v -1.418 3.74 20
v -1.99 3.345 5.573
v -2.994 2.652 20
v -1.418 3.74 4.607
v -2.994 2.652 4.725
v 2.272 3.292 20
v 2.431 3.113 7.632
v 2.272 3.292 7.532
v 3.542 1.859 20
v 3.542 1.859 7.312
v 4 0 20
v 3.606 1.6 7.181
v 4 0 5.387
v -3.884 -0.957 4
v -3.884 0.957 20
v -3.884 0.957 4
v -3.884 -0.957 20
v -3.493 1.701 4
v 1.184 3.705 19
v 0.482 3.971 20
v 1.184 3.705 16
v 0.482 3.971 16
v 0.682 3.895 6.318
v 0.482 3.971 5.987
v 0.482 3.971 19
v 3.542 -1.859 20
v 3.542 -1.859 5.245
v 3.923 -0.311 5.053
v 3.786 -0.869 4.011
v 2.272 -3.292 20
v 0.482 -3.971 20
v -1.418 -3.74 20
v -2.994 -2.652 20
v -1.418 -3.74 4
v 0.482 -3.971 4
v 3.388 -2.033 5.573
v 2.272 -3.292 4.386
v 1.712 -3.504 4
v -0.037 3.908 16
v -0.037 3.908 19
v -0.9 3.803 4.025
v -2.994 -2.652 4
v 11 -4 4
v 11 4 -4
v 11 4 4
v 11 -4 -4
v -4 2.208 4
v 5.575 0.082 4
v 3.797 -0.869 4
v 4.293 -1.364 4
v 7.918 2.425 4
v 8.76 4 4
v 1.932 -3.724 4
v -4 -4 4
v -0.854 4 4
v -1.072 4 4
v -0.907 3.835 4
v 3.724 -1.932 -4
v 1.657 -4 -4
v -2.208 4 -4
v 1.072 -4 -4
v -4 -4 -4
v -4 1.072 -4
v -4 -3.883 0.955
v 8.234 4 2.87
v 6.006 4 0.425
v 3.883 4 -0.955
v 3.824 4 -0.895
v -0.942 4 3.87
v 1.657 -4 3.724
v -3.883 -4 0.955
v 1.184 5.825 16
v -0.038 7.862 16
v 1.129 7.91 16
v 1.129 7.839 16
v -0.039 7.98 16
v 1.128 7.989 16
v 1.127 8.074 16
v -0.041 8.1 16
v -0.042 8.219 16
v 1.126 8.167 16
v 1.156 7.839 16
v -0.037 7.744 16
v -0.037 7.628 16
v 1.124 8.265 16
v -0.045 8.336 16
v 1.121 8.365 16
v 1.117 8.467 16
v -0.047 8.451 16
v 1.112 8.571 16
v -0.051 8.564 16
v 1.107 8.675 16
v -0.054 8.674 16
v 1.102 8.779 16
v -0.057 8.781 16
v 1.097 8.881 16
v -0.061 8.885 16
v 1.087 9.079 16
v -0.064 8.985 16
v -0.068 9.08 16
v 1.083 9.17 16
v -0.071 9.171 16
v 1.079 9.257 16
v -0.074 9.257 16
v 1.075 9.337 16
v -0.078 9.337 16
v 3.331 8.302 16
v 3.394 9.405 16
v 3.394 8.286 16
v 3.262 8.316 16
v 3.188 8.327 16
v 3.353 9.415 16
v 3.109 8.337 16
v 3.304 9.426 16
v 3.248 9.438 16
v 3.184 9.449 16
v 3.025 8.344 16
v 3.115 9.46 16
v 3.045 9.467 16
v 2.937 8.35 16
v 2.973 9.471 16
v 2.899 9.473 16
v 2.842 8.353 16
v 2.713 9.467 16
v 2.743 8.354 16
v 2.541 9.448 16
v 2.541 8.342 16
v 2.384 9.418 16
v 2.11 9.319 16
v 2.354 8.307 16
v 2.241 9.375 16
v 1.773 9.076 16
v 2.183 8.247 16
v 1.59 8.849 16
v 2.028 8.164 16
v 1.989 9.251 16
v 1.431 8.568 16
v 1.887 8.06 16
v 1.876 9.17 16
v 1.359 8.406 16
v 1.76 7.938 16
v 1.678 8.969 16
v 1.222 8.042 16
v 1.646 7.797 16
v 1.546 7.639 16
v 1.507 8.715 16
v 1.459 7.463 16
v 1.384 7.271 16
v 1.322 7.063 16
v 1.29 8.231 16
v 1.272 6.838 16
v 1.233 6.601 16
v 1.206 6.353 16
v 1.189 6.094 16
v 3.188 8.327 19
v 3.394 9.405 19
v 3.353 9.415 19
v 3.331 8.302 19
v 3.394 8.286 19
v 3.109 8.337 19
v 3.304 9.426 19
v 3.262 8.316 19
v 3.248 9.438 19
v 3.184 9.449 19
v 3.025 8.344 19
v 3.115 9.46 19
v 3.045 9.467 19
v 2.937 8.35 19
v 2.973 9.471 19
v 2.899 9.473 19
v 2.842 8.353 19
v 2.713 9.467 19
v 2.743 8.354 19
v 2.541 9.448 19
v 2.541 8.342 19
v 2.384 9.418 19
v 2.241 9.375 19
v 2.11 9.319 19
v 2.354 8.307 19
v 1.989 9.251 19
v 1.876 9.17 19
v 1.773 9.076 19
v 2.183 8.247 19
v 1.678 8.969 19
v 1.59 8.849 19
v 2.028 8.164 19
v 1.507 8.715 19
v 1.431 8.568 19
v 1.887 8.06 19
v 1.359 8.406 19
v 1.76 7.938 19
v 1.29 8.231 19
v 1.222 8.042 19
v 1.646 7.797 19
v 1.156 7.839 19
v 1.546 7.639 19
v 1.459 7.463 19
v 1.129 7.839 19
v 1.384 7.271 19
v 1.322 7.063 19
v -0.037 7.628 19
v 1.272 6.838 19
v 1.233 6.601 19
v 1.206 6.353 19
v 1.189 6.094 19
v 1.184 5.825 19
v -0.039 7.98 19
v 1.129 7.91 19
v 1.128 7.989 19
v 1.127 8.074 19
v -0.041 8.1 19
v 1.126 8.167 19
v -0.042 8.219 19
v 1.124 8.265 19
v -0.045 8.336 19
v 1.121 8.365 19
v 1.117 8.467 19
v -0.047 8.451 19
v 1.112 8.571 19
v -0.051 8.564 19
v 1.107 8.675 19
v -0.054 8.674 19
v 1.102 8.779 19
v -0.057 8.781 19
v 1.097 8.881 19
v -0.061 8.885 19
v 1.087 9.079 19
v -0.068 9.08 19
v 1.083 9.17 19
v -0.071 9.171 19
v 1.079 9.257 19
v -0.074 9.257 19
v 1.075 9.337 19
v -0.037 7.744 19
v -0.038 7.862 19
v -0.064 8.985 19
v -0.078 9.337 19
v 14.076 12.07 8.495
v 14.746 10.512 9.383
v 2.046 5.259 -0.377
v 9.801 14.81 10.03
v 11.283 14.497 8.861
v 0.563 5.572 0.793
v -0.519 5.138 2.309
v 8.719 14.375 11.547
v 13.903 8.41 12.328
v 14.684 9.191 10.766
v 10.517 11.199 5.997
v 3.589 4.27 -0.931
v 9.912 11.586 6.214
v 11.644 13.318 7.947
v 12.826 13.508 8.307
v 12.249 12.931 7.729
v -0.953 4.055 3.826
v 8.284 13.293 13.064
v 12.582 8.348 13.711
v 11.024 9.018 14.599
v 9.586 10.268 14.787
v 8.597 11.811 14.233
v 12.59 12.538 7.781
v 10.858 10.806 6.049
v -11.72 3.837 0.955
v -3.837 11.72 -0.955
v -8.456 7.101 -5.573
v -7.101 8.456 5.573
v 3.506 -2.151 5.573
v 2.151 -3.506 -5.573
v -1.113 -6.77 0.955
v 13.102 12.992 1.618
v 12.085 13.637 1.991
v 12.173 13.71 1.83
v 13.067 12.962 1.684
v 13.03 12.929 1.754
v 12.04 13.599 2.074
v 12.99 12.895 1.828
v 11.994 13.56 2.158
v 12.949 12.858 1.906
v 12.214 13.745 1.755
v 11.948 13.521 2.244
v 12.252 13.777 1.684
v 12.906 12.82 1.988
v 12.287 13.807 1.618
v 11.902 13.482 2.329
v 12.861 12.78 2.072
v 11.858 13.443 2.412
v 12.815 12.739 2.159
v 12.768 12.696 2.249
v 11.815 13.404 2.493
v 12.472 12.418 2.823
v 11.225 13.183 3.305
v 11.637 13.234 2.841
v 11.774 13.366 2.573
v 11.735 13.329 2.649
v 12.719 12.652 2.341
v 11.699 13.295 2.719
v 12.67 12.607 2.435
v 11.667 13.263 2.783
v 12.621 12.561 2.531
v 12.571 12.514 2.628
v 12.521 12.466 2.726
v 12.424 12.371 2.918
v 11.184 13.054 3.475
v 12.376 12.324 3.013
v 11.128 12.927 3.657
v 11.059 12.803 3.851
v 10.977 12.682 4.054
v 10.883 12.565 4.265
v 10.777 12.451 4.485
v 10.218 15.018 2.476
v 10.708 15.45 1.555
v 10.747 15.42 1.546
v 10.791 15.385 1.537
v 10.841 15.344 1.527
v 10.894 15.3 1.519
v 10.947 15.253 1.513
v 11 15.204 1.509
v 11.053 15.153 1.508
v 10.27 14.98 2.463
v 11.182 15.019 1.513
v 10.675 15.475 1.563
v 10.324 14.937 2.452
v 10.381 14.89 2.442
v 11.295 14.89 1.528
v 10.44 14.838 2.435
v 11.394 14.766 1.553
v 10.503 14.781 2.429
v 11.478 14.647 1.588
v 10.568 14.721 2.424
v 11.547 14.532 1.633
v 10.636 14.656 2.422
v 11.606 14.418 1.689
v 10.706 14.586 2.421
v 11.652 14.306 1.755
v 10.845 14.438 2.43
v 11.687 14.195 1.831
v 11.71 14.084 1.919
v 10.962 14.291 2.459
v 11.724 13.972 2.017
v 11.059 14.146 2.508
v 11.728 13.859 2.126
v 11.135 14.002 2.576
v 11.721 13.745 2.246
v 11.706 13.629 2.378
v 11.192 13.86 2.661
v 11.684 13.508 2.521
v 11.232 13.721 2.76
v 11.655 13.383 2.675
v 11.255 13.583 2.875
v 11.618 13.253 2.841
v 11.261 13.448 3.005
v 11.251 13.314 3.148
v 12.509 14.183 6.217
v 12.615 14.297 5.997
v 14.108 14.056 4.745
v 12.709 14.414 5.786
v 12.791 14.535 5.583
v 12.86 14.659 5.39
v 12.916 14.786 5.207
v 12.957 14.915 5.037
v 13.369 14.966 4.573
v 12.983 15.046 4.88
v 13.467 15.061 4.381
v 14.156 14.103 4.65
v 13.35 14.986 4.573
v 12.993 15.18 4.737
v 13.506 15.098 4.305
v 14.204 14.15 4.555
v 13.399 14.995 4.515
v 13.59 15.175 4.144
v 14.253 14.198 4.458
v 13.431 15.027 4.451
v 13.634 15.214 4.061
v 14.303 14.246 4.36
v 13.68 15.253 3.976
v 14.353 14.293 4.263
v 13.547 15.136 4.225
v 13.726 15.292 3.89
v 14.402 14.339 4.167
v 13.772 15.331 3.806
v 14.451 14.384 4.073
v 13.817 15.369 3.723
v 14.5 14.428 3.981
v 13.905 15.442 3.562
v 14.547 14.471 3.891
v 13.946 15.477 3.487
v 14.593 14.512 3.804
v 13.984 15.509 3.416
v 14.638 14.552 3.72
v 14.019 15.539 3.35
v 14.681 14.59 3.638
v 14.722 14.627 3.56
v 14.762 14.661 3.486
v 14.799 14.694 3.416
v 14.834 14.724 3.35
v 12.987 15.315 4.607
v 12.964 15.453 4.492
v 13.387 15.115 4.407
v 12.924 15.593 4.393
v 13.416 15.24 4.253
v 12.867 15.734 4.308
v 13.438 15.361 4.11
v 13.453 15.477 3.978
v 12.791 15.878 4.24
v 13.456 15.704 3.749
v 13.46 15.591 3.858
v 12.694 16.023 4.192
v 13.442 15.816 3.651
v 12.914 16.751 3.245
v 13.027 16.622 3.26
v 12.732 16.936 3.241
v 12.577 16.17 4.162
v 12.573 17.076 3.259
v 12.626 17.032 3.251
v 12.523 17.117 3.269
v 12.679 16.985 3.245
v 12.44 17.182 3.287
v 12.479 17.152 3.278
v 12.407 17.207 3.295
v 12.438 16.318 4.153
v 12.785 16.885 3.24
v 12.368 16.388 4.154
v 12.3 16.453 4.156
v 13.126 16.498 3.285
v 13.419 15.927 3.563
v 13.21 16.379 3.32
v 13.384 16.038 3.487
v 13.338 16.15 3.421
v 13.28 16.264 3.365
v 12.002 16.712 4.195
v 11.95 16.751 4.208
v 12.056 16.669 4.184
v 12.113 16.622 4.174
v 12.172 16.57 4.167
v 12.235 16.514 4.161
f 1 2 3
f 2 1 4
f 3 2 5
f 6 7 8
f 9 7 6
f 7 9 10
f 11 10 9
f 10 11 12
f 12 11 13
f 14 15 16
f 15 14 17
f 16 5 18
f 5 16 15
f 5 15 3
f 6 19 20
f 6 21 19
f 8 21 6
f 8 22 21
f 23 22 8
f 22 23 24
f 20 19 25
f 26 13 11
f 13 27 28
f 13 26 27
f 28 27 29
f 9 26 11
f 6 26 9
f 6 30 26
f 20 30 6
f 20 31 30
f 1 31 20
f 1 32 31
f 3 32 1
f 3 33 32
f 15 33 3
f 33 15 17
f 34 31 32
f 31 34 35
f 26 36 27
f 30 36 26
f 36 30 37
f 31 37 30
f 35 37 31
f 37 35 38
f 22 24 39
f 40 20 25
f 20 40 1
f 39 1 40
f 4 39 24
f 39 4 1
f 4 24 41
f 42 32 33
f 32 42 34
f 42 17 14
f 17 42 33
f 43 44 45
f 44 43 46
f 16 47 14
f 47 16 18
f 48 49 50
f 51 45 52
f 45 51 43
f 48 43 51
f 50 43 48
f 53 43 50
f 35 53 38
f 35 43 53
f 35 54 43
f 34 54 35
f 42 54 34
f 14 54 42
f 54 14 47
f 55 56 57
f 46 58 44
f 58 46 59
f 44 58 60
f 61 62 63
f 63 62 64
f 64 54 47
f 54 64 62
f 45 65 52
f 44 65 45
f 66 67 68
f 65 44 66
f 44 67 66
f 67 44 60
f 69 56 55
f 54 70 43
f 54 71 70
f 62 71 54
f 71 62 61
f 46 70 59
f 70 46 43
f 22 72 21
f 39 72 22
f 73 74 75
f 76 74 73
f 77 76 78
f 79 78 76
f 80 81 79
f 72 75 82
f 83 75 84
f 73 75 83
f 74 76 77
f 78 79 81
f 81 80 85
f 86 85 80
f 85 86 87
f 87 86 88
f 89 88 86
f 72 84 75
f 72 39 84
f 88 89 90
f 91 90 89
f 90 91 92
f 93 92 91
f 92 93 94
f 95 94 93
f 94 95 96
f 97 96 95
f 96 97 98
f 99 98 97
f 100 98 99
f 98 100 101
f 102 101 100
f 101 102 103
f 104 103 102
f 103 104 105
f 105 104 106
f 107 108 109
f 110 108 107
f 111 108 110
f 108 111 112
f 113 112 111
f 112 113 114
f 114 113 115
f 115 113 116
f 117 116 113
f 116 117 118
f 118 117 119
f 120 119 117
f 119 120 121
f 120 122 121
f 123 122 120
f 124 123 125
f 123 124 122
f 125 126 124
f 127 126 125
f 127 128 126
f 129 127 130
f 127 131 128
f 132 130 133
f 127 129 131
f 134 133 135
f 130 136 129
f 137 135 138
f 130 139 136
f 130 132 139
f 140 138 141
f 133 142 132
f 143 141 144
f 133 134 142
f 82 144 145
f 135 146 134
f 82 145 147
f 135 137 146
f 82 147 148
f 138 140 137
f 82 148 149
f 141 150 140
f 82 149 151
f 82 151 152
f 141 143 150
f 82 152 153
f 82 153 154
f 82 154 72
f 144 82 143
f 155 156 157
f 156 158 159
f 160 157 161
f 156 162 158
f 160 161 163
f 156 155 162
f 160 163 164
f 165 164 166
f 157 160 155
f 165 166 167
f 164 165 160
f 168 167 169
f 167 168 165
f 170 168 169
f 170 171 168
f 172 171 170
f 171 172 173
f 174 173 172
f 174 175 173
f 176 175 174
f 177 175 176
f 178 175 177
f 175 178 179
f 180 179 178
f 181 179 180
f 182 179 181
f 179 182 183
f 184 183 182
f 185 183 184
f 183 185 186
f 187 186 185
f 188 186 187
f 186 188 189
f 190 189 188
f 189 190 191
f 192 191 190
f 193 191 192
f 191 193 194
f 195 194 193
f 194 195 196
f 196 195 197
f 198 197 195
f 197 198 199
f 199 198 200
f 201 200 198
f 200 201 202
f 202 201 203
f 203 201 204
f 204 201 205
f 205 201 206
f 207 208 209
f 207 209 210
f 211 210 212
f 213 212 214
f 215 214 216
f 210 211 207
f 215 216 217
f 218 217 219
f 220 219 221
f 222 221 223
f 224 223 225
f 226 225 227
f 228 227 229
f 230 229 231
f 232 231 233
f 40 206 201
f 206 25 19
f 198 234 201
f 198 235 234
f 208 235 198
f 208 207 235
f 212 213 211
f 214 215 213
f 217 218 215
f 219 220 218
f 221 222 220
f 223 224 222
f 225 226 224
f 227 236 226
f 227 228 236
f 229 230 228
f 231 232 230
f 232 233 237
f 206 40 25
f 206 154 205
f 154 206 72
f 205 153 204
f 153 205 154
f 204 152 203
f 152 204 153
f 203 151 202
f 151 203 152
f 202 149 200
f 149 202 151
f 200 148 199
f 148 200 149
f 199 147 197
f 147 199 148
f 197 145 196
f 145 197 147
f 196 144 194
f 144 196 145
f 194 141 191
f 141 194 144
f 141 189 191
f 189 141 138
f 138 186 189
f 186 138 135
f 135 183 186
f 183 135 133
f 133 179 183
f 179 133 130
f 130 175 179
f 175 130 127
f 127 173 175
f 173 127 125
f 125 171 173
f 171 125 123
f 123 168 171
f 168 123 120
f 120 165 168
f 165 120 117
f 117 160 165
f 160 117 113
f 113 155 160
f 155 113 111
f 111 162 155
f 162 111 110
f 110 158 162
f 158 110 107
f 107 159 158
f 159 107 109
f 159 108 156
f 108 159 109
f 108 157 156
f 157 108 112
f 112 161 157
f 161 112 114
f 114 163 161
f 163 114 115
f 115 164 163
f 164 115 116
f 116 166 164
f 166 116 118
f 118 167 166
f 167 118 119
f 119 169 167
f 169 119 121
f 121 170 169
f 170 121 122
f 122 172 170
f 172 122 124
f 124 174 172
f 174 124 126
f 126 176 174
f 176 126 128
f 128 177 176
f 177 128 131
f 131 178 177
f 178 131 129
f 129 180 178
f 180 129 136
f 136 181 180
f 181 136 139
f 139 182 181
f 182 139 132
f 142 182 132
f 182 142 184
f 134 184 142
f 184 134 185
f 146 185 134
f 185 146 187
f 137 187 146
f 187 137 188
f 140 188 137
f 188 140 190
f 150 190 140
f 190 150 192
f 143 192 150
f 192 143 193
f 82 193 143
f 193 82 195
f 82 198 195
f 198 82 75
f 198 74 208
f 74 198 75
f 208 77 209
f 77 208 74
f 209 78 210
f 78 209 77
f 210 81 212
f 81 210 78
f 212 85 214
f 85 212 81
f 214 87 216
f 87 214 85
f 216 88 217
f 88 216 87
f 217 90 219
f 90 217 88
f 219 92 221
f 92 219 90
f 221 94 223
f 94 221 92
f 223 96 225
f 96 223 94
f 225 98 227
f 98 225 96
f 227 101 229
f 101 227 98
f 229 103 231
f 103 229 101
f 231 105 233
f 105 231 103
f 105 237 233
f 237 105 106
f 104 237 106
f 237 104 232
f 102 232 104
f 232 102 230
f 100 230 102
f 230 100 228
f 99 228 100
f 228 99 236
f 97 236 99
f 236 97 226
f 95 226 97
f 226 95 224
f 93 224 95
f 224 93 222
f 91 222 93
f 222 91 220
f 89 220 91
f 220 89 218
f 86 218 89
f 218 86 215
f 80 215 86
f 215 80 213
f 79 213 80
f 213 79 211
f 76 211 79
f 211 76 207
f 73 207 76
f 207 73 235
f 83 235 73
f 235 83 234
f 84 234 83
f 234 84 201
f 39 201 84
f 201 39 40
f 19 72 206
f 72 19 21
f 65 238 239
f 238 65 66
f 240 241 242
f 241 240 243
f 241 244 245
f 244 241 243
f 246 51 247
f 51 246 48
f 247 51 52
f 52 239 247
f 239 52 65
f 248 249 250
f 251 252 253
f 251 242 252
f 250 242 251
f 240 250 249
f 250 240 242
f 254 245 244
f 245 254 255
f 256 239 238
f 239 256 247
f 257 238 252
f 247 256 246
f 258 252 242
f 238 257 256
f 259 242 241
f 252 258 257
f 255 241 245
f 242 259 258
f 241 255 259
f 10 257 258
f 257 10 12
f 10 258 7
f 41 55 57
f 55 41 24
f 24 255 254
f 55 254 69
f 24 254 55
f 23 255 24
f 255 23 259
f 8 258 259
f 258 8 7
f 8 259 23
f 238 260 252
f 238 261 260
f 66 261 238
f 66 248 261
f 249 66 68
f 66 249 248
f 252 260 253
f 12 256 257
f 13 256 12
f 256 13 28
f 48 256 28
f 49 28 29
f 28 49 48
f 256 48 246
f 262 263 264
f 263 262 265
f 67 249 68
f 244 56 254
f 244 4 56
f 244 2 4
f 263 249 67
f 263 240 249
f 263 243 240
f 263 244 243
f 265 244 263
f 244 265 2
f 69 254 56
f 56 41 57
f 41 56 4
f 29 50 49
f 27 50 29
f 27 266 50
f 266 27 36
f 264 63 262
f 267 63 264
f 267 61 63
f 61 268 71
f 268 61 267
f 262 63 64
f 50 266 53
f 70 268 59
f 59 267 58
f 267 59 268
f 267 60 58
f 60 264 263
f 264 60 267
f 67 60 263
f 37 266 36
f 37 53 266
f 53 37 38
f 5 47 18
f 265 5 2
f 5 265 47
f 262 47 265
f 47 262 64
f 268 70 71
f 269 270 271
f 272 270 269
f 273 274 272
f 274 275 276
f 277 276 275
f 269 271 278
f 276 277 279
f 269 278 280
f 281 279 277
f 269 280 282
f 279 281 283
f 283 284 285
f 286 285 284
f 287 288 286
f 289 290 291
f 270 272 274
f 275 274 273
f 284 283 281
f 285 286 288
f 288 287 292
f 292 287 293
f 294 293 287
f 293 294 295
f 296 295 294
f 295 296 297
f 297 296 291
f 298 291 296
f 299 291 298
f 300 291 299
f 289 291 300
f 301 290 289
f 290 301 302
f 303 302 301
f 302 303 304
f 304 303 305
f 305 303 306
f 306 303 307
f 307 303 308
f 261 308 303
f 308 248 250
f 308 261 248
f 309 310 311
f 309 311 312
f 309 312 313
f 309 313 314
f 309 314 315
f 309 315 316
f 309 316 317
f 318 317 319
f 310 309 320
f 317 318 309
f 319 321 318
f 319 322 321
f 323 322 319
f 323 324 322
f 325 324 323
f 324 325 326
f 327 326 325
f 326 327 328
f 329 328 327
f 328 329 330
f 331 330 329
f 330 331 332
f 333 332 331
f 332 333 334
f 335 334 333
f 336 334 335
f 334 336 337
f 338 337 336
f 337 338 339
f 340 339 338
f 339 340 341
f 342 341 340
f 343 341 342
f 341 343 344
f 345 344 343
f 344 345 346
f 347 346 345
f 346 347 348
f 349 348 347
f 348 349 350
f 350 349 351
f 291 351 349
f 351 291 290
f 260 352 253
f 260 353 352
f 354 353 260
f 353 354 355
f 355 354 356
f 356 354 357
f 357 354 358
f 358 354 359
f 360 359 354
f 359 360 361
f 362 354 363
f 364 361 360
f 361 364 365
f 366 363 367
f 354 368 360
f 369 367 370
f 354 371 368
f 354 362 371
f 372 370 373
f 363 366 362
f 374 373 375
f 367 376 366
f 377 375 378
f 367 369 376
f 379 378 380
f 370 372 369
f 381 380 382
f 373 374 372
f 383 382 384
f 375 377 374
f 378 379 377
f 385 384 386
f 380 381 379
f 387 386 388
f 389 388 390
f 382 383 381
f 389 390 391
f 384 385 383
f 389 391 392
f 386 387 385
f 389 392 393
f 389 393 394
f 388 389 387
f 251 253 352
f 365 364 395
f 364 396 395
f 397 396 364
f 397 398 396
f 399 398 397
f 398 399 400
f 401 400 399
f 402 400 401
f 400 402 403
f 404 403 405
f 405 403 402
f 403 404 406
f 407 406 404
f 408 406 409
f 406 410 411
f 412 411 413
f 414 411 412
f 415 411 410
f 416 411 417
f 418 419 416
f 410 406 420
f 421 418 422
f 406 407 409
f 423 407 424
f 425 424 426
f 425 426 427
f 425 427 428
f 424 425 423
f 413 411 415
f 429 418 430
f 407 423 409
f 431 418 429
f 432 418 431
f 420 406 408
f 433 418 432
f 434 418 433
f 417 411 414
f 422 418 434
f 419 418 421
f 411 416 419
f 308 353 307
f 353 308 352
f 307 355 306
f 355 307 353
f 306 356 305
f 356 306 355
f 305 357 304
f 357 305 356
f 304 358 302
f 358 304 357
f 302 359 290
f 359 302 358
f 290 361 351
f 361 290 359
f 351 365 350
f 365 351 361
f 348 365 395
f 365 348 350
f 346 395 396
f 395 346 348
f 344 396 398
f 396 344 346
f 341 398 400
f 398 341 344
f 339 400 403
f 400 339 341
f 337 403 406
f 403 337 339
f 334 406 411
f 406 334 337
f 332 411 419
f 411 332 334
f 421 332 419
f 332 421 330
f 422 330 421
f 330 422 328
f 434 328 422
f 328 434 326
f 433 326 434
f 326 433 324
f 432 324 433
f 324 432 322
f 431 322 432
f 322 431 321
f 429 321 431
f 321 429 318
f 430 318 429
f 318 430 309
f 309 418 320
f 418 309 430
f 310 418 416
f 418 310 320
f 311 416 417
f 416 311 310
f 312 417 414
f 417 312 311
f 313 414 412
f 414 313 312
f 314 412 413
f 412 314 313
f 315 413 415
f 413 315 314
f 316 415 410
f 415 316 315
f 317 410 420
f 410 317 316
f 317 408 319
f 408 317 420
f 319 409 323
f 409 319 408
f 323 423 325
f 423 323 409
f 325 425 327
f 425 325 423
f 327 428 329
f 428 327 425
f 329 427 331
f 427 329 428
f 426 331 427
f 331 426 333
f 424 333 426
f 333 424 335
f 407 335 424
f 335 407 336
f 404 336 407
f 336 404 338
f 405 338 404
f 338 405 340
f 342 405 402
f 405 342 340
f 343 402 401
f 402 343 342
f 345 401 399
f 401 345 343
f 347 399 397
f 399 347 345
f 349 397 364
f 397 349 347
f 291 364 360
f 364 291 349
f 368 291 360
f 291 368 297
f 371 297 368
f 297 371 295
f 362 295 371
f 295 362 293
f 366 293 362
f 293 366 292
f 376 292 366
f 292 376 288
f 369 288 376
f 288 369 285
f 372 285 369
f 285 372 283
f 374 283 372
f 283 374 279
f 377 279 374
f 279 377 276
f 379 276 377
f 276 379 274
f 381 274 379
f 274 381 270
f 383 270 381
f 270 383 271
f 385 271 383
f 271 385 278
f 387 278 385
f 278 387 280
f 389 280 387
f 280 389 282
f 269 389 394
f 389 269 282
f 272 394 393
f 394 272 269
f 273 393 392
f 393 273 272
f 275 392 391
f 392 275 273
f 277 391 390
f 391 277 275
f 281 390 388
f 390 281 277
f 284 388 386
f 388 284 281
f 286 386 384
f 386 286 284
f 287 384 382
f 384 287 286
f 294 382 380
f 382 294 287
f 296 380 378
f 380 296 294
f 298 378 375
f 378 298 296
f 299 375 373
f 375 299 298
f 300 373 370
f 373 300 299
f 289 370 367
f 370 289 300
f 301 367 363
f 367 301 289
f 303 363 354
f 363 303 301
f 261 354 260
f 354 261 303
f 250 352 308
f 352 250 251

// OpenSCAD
color("red") {
    cylinder(20,4,4);
    translate([3.5,0,0]) cube([15,8,8],center=true);
    translate([-1,2,16]) linear_extrude(height = 3) text("r");
}

color("blue")
multmatrix([
    [-0.707107, 0.408, 0.57735],
    [ 0.707107, 0.408, 0.57735],
    [ 0,        -0.816, 0.57735]
]) {
    cylinder(20,4,4);
    translate([3.5,0,0]) cube([15,8,8],center=true);
    translate([-1,2,16]) linear_extrude(height = 3) text("r");
}
